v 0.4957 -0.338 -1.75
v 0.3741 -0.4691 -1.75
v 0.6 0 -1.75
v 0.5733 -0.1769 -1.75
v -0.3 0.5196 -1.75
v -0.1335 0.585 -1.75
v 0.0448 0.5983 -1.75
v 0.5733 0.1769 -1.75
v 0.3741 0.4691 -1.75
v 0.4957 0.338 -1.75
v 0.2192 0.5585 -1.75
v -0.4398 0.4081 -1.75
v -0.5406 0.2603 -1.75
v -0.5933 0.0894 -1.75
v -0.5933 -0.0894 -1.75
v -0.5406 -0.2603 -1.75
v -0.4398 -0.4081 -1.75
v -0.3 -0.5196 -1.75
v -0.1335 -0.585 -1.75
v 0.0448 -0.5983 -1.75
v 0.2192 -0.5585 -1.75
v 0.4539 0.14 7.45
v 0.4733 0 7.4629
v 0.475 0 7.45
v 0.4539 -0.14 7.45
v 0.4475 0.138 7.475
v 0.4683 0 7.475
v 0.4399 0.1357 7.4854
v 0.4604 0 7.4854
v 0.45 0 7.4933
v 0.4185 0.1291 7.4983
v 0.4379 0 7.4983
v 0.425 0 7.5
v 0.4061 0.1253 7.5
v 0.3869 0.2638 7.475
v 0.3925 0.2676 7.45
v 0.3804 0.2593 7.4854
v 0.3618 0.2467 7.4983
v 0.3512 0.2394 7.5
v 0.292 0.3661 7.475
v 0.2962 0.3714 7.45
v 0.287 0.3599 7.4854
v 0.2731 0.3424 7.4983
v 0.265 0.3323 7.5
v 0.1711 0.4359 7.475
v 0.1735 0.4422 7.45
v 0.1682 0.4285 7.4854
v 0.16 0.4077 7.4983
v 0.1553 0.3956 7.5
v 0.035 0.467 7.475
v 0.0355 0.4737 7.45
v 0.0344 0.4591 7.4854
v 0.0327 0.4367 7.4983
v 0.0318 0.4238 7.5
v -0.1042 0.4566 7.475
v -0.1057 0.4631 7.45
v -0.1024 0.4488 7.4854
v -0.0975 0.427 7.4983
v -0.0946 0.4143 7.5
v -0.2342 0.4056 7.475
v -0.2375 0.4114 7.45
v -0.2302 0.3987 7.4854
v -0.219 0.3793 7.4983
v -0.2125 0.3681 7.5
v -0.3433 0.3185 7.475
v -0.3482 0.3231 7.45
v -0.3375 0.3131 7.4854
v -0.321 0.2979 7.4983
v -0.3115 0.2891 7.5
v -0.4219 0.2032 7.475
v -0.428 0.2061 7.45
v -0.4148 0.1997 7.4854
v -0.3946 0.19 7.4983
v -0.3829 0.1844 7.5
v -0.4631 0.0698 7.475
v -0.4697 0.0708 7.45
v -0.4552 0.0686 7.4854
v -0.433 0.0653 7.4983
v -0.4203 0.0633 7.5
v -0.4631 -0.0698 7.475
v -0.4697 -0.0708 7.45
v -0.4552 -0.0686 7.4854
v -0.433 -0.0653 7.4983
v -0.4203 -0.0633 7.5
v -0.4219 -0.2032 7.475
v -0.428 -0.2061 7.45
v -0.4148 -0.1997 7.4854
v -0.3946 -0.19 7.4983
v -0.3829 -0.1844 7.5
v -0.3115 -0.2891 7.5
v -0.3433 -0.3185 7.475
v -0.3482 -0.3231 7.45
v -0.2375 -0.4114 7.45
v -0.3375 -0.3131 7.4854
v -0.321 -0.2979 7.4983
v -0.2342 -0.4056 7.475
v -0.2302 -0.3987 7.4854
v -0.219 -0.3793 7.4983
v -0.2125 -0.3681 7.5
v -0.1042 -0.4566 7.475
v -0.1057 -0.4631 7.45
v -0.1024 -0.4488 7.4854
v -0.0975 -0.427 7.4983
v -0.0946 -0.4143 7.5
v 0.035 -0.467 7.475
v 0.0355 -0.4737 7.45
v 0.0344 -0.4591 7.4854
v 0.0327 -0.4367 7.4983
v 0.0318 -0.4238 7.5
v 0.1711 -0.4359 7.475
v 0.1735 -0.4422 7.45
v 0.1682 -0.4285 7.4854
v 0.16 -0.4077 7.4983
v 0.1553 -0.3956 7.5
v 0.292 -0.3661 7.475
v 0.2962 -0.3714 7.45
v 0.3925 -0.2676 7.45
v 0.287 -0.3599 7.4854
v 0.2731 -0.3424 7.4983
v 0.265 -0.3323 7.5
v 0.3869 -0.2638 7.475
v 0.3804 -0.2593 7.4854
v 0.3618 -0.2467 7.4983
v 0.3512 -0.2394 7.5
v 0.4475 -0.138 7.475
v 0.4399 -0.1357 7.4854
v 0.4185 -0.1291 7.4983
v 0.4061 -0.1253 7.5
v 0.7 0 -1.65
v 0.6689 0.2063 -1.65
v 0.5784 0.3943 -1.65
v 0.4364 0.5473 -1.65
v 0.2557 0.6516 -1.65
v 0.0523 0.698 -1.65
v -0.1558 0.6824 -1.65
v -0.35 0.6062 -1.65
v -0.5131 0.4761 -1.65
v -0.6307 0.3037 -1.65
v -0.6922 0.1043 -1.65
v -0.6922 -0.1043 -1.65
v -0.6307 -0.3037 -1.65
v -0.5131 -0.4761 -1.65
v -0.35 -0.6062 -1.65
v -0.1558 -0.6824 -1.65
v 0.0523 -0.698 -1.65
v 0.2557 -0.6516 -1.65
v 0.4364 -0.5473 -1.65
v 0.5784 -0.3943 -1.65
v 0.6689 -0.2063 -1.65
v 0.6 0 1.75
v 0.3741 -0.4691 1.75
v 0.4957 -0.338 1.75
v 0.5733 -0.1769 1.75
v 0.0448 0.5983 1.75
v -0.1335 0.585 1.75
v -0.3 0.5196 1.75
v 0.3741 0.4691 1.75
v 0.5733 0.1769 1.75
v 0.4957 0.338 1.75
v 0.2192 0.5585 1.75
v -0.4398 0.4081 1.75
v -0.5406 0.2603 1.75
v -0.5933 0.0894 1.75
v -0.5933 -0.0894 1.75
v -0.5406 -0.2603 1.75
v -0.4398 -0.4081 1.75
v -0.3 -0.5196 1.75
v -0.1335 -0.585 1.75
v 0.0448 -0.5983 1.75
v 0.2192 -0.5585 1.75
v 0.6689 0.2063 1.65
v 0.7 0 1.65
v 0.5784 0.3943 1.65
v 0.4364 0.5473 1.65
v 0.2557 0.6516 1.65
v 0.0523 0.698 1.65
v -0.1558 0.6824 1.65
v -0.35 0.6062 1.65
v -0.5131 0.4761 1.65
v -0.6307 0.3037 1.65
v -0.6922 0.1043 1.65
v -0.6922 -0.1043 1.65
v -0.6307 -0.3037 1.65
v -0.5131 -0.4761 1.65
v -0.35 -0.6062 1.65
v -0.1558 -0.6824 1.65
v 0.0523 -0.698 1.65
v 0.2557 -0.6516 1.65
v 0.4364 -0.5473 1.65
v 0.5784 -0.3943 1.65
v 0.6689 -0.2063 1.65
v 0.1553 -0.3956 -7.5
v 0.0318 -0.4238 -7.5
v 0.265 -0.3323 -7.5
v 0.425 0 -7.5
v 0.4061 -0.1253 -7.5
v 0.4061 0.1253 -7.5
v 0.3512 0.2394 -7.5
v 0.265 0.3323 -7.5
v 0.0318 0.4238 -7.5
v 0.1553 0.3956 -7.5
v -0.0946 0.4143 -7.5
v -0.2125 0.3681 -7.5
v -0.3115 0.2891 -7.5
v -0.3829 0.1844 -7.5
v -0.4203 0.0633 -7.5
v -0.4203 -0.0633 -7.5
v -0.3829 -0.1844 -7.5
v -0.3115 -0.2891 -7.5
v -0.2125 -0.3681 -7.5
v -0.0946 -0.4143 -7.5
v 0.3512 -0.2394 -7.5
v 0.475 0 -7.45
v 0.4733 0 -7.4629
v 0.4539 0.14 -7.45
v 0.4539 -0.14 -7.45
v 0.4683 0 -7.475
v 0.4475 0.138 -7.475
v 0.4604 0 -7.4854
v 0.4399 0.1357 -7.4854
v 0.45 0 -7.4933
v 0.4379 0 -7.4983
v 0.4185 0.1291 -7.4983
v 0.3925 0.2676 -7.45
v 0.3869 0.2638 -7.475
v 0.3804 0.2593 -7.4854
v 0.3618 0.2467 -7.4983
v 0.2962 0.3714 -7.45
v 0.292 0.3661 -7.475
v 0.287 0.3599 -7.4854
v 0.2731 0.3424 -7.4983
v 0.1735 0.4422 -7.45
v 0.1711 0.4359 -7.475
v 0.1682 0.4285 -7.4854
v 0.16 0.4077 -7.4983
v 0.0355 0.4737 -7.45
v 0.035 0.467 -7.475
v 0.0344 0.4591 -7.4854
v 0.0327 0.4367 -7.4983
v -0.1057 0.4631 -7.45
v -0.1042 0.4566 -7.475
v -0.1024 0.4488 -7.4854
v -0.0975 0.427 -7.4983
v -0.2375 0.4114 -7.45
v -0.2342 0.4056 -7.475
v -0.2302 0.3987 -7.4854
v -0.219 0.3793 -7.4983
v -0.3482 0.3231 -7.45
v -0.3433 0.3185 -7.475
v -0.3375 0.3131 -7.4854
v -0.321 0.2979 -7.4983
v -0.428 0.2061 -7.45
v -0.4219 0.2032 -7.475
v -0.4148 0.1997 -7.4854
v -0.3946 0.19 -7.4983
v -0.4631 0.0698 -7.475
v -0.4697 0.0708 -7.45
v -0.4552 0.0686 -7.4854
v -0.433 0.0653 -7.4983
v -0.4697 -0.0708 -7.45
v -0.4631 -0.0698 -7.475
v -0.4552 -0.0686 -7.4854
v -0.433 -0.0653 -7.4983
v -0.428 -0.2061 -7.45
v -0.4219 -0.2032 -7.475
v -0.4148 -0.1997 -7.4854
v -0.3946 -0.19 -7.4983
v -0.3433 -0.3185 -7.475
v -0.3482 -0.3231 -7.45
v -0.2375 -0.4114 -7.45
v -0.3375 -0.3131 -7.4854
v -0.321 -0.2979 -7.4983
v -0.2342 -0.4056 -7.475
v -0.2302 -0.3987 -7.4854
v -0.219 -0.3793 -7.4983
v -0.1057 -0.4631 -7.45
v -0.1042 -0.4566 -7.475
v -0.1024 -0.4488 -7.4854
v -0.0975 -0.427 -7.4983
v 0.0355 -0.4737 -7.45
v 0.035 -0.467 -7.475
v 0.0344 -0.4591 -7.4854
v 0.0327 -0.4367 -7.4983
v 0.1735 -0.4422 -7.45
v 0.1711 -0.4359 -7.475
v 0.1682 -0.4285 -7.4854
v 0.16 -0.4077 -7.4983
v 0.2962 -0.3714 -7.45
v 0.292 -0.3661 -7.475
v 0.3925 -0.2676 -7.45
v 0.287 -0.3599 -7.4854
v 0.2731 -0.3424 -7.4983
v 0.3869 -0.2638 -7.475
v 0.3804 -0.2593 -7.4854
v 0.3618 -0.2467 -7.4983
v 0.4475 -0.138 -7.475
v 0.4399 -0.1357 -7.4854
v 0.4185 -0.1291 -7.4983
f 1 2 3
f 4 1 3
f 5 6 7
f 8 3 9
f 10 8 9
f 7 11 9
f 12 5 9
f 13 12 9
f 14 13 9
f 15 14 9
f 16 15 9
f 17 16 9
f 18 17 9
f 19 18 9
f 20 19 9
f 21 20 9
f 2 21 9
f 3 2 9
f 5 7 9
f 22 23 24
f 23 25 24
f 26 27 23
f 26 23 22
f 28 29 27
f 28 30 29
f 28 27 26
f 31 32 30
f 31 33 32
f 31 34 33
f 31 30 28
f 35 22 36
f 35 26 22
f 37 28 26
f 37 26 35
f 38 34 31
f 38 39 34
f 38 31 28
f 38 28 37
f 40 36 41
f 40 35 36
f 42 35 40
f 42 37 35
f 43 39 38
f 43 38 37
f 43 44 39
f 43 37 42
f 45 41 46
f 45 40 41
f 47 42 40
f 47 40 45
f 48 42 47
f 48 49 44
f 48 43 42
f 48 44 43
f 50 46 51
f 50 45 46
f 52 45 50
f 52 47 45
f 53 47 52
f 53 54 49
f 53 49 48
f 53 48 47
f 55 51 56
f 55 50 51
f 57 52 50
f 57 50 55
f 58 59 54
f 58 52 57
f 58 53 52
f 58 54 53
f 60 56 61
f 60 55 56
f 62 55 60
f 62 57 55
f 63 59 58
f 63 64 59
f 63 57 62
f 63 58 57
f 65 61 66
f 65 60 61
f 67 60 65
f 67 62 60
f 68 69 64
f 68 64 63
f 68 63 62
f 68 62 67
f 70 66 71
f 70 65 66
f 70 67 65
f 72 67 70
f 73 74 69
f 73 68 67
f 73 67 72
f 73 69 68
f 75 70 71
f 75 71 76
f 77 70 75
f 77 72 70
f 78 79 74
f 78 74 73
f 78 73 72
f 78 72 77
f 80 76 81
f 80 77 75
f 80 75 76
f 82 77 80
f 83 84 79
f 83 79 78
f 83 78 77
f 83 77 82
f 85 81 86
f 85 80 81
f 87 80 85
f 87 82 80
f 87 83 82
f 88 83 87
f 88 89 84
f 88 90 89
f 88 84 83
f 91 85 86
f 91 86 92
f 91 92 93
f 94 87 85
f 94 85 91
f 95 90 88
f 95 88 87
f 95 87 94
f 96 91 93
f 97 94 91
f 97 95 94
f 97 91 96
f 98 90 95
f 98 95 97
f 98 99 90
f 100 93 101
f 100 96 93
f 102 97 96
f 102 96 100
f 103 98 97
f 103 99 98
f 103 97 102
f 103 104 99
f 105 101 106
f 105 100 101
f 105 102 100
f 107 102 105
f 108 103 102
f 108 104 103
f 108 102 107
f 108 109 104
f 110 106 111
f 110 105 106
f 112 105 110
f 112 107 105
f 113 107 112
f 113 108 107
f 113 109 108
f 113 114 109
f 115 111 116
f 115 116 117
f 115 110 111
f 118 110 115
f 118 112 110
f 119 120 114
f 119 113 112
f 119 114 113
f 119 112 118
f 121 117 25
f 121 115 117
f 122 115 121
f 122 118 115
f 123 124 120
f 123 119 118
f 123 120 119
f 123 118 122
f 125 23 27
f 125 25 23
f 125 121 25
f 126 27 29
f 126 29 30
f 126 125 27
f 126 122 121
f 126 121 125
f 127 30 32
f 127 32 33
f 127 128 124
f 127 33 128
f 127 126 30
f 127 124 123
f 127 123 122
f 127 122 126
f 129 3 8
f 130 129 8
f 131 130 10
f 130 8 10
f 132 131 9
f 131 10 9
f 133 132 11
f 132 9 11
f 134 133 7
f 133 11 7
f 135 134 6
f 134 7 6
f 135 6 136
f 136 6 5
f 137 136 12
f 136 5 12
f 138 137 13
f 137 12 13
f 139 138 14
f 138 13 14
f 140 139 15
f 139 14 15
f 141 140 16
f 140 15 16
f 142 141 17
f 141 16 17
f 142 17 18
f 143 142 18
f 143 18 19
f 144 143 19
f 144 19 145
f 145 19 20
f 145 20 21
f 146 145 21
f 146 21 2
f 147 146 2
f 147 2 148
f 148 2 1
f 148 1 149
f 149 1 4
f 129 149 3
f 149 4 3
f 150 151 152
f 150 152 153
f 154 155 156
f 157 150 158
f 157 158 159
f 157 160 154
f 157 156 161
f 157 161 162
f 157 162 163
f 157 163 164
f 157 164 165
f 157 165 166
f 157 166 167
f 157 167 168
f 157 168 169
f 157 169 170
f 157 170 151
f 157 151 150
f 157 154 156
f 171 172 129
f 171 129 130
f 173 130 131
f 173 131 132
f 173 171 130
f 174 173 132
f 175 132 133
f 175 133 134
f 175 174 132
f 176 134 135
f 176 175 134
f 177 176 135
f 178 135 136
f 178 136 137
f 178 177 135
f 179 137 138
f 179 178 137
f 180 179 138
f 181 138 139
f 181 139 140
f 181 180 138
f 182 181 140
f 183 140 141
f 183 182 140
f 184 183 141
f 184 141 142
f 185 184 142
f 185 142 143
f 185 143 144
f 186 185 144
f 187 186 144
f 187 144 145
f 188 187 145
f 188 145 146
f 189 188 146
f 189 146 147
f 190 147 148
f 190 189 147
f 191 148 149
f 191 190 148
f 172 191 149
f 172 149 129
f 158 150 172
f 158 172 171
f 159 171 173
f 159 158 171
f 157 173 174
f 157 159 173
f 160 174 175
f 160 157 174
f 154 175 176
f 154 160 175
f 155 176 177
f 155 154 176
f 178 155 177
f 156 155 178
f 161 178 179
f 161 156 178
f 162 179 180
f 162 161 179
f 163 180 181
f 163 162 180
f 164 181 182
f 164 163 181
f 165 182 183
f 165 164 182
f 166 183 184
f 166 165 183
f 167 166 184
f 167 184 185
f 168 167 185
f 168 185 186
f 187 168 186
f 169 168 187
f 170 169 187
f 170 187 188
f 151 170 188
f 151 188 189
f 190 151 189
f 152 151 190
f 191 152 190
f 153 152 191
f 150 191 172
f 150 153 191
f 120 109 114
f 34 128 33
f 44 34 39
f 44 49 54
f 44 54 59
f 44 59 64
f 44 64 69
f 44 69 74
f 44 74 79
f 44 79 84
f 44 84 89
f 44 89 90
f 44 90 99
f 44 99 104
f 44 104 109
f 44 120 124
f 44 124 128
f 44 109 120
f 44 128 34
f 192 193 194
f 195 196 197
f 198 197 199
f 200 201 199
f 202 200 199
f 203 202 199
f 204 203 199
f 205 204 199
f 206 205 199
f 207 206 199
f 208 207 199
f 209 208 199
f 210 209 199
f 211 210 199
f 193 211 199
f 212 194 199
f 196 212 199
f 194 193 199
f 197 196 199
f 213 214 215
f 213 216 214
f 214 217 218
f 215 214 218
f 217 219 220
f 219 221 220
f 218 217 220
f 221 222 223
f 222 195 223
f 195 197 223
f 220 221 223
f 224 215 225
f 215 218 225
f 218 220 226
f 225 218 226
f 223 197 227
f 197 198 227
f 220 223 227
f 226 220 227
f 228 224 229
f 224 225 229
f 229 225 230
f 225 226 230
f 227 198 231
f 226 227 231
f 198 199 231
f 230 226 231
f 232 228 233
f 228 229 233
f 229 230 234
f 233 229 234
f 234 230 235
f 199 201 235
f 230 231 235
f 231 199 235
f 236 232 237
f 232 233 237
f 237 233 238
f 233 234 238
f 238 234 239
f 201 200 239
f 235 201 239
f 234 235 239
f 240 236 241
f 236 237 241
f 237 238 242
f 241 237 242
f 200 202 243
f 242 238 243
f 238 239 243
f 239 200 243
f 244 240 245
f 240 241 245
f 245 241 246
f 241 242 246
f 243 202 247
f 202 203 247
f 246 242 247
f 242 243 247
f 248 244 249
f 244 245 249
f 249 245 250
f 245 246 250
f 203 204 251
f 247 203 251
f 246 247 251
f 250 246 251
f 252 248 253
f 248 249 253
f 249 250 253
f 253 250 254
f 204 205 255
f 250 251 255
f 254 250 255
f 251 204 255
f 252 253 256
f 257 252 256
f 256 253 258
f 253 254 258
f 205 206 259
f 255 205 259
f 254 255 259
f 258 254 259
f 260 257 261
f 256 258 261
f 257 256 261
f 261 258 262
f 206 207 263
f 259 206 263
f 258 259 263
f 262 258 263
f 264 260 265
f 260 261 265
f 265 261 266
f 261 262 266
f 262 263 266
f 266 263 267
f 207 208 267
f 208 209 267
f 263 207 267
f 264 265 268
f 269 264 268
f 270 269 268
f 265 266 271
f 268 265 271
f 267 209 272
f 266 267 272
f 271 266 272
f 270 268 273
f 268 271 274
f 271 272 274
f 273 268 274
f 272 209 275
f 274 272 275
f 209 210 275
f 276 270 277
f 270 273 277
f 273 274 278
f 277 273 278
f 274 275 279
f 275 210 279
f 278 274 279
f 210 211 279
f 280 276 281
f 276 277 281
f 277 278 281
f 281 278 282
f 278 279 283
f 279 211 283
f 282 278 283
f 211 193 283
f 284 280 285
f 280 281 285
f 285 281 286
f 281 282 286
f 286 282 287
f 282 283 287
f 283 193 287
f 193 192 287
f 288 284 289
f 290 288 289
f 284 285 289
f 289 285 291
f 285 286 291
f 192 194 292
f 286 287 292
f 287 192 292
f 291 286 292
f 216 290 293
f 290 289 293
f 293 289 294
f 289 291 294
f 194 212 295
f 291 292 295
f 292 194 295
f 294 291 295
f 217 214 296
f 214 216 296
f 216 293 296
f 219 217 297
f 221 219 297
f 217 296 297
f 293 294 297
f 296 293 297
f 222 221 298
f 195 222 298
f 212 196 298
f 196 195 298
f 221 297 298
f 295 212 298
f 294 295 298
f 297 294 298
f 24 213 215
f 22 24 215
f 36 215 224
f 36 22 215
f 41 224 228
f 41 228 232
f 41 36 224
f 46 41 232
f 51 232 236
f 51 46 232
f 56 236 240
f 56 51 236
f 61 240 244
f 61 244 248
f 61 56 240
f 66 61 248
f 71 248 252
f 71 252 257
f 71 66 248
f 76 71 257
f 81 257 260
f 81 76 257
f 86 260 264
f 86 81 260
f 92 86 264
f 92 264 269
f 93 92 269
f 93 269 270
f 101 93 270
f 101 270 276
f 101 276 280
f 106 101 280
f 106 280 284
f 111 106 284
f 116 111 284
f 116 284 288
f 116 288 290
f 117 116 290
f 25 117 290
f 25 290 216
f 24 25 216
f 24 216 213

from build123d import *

# Parameters (mm, degrees)
SKETCH1_R           = 0.475
BOSS_EXTRUDE1_DEPTH = 7.5
BOSS_EXTRUDE2_START = -5.75
SKETCH2_R           = 0.7
BOSS_EXTRUDE2_DEPTH = 3.5
CHAMFER1_SIZE       = 0.1
FILLET1_R           = 0.05


with BuildPart() as part:
    # Sketch1 → Boss-Extrude1 (new, symmetric)
    with BuildSketch(Plane.XY):
        Circle(SKETCH1_R)
    extrude(amount=BOSS_EXTRUDE1_DEPTH, both=True)

    # Fillet1
    fillet1_edges = [part.edges().sort_by_distance(p)[0] for p in [
        (-0.475, 0, -7.5),
        (-0.475, 0, 7.5),
    ]]
    fillet(fillet1_edges, radius=FILLET1_R)


with BuildPart() as body_2:
    # Sketch2 → Boss-Extrude2 (new body)
    with BuildSketch(Plane.XY.offset(7.5).offset(BOSS_EXTRUDE2_START)):
        Circle(SKETCH2_R)
    extrude(amount=-BOSS_EXTRUDE2_DEPTH)

    # Chamfer1
    chamfer1_edges = [body_2.edges().sort_by_distance(p)[0] for p in [
        (-0.7, 0, 1.75),
        (-0.7, 0, -1.75),
    ]]
    chamfer(chamfer1_edges, length=CHAMFER1_SIZE)


solid = Compound([part.part, body_2.part])
